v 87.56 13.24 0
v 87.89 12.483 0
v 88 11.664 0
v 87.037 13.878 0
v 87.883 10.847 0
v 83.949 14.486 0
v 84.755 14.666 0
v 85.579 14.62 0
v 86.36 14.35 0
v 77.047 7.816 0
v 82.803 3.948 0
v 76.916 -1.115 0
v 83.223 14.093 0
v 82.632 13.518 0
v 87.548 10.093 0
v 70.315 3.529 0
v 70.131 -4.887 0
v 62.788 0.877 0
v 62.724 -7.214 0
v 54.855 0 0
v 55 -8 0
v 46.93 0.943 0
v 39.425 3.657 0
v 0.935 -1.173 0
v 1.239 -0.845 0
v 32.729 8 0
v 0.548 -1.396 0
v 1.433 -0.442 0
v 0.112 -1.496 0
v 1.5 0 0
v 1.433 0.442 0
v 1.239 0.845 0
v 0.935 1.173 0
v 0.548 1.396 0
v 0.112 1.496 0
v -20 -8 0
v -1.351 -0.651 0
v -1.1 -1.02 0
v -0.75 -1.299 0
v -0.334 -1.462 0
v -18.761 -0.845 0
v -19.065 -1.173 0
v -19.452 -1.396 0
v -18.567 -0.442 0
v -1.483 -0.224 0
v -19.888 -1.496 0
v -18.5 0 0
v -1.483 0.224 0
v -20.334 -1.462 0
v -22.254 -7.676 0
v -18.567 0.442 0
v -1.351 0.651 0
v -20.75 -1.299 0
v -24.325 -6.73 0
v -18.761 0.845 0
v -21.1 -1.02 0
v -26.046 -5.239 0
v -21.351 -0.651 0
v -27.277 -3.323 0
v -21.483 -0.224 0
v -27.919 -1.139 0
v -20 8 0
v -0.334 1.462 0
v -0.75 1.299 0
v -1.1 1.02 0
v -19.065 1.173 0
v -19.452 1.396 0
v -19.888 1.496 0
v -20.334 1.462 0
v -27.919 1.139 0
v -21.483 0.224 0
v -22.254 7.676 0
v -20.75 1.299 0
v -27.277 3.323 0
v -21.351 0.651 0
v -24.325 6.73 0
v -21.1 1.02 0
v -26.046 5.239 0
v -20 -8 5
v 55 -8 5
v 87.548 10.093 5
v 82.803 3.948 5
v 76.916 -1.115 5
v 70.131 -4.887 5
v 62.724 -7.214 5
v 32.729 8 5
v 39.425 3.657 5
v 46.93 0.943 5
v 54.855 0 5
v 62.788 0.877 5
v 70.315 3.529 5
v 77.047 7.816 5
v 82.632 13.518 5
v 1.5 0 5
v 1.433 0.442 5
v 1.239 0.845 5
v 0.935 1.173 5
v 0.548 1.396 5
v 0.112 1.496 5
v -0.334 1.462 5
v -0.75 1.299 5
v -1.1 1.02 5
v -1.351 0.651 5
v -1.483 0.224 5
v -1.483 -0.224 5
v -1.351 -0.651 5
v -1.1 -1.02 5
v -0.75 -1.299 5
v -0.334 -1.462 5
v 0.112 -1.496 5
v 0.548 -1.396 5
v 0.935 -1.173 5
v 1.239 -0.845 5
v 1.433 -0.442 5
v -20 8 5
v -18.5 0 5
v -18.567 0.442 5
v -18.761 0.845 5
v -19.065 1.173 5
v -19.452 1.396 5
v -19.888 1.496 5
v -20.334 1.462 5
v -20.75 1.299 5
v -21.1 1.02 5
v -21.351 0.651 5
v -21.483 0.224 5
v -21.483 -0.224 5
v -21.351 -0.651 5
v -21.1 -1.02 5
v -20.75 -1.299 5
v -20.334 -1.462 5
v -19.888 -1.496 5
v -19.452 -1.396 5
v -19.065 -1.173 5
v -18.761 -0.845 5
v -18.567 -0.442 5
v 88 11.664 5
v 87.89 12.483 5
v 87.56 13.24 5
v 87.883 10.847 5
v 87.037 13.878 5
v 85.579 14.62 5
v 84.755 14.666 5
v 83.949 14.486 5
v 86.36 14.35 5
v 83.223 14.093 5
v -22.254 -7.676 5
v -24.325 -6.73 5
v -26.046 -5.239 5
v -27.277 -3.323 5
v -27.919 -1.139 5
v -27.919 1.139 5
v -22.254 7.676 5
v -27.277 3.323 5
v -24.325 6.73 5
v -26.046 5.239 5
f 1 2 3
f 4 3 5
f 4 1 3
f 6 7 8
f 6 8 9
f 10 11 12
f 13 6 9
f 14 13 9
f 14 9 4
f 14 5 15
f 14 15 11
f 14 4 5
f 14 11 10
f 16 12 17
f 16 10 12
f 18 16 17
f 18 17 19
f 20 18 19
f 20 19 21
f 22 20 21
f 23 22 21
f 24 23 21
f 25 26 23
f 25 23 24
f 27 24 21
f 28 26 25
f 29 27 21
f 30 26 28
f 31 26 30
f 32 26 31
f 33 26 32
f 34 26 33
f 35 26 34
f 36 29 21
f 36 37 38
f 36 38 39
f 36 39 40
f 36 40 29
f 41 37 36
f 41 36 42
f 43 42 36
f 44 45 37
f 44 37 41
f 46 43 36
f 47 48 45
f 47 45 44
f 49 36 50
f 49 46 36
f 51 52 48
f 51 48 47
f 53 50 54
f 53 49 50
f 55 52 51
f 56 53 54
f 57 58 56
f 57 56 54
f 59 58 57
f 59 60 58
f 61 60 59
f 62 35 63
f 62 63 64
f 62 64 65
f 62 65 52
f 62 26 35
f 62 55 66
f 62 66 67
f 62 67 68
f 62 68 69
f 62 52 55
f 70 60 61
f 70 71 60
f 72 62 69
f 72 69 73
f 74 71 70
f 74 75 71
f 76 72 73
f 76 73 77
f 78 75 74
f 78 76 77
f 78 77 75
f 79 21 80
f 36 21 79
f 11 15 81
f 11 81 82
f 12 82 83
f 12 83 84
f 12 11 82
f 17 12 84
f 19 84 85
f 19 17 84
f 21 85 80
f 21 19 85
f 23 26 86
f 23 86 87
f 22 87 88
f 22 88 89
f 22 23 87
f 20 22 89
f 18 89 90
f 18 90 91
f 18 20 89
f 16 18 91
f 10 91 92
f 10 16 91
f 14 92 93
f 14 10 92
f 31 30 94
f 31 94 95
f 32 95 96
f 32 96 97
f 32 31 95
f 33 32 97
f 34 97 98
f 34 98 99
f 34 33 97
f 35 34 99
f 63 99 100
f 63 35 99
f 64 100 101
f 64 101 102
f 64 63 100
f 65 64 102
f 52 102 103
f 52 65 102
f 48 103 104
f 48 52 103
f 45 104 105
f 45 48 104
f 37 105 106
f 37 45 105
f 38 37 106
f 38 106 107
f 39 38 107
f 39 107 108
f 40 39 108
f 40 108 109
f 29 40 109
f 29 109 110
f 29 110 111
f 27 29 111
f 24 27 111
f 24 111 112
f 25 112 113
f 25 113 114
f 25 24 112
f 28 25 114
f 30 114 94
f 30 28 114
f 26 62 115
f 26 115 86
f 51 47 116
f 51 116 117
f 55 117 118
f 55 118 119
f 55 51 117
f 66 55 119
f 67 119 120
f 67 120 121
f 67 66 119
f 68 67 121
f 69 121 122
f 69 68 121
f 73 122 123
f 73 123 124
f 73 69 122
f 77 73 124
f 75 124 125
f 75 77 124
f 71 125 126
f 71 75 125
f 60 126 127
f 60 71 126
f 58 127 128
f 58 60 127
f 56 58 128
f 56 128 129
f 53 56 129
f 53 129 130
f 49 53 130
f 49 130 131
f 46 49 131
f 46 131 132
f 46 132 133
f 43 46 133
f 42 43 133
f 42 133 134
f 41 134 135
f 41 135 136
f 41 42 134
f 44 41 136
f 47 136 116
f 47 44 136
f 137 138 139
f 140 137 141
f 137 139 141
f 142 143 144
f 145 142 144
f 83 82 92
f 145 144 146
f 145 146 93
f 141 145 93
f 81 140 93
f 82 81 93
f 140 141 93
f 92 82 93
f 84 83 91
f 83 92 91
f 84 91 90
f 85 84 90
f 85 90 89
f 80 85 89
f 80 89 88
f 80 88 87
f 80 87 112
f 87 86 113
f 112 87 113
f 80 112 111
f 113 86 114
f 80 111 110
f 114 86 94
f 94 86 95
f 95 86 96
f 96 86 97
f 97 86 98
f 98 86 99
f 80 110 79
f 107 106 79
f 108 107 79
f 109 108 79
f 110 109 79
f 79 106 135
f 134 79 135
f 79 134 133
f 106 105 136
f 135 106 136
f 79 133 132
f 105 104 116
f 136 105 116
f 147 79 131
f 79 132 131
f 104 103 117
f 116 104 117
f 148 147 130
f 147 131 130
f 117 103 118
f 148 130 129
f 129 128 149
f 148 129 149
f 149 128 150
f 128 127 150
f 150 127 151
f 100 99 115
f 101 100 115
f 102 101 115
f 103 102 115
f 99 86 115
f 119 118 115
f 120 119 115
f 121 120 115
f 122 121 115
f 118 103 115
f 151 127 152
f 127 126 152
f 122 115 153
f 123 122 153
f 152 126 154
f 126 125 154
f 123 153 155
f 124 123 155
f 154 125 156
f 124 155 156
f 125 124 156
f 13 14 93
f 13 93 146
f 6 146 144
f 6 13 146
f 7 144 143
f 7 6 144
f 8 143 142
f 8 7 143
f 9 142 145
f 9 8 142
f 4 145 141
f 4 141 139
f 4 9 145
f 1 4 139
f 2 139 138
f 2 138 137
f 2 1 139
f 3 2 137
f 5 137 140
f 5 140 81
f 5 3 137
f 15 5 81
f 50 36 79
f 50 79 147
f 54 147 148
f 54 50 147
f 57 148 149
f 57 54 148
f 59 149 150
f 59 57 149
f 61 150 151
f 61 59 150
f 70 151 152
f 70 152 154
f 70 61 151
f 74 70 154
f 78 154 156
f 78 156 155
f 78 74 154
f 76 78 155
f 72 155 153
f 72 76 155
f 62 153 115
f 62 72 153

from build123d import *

# Parameters (mm, degrees)
ESQUISSE1_R        = 1.5
BOSS_EXTRU_1_DEPTH = 5


with BuildPart() as part:
    # Esquisse1 → Boss.-Extru.1 (new body)
    with BuildSketch(Plane.XY):
        with BuildLine():
            Line((0, 8), (20, 8))
            Line((20, 8), (32.728942549, 8))
            ThreePointArc((32.728942549, 8), (58.84637819, 0.211993808), (82.631578947, 13.517545651))
            ThreePointArc((82.631578947, 13.517545651), (86.714862069, 14.137746418), (87.547938522, 10.092522856))
            ThreePointArc((87.547938522, 10.092522856), (73.619262105, -3.172854276), (55, -8))
            Line((55, -8), (0, -8))
            Line((0, -8), (-20, -8))
            ThreePointArc((-20, -8), (-28, 0), (-20, 8))
            Line((-20, 8), (0, 8))
        make_face()
        Circle(ESQUISSE1_R, mode=Mode.SUBTRACT)
        with Locations((-20, 0)):
            Circle(ESQUISSE1_R, mode=Mode.SUBTRACT)
    extrude(amount=BOSS_EXTRU_1_DEPTH)


solid = part.part
